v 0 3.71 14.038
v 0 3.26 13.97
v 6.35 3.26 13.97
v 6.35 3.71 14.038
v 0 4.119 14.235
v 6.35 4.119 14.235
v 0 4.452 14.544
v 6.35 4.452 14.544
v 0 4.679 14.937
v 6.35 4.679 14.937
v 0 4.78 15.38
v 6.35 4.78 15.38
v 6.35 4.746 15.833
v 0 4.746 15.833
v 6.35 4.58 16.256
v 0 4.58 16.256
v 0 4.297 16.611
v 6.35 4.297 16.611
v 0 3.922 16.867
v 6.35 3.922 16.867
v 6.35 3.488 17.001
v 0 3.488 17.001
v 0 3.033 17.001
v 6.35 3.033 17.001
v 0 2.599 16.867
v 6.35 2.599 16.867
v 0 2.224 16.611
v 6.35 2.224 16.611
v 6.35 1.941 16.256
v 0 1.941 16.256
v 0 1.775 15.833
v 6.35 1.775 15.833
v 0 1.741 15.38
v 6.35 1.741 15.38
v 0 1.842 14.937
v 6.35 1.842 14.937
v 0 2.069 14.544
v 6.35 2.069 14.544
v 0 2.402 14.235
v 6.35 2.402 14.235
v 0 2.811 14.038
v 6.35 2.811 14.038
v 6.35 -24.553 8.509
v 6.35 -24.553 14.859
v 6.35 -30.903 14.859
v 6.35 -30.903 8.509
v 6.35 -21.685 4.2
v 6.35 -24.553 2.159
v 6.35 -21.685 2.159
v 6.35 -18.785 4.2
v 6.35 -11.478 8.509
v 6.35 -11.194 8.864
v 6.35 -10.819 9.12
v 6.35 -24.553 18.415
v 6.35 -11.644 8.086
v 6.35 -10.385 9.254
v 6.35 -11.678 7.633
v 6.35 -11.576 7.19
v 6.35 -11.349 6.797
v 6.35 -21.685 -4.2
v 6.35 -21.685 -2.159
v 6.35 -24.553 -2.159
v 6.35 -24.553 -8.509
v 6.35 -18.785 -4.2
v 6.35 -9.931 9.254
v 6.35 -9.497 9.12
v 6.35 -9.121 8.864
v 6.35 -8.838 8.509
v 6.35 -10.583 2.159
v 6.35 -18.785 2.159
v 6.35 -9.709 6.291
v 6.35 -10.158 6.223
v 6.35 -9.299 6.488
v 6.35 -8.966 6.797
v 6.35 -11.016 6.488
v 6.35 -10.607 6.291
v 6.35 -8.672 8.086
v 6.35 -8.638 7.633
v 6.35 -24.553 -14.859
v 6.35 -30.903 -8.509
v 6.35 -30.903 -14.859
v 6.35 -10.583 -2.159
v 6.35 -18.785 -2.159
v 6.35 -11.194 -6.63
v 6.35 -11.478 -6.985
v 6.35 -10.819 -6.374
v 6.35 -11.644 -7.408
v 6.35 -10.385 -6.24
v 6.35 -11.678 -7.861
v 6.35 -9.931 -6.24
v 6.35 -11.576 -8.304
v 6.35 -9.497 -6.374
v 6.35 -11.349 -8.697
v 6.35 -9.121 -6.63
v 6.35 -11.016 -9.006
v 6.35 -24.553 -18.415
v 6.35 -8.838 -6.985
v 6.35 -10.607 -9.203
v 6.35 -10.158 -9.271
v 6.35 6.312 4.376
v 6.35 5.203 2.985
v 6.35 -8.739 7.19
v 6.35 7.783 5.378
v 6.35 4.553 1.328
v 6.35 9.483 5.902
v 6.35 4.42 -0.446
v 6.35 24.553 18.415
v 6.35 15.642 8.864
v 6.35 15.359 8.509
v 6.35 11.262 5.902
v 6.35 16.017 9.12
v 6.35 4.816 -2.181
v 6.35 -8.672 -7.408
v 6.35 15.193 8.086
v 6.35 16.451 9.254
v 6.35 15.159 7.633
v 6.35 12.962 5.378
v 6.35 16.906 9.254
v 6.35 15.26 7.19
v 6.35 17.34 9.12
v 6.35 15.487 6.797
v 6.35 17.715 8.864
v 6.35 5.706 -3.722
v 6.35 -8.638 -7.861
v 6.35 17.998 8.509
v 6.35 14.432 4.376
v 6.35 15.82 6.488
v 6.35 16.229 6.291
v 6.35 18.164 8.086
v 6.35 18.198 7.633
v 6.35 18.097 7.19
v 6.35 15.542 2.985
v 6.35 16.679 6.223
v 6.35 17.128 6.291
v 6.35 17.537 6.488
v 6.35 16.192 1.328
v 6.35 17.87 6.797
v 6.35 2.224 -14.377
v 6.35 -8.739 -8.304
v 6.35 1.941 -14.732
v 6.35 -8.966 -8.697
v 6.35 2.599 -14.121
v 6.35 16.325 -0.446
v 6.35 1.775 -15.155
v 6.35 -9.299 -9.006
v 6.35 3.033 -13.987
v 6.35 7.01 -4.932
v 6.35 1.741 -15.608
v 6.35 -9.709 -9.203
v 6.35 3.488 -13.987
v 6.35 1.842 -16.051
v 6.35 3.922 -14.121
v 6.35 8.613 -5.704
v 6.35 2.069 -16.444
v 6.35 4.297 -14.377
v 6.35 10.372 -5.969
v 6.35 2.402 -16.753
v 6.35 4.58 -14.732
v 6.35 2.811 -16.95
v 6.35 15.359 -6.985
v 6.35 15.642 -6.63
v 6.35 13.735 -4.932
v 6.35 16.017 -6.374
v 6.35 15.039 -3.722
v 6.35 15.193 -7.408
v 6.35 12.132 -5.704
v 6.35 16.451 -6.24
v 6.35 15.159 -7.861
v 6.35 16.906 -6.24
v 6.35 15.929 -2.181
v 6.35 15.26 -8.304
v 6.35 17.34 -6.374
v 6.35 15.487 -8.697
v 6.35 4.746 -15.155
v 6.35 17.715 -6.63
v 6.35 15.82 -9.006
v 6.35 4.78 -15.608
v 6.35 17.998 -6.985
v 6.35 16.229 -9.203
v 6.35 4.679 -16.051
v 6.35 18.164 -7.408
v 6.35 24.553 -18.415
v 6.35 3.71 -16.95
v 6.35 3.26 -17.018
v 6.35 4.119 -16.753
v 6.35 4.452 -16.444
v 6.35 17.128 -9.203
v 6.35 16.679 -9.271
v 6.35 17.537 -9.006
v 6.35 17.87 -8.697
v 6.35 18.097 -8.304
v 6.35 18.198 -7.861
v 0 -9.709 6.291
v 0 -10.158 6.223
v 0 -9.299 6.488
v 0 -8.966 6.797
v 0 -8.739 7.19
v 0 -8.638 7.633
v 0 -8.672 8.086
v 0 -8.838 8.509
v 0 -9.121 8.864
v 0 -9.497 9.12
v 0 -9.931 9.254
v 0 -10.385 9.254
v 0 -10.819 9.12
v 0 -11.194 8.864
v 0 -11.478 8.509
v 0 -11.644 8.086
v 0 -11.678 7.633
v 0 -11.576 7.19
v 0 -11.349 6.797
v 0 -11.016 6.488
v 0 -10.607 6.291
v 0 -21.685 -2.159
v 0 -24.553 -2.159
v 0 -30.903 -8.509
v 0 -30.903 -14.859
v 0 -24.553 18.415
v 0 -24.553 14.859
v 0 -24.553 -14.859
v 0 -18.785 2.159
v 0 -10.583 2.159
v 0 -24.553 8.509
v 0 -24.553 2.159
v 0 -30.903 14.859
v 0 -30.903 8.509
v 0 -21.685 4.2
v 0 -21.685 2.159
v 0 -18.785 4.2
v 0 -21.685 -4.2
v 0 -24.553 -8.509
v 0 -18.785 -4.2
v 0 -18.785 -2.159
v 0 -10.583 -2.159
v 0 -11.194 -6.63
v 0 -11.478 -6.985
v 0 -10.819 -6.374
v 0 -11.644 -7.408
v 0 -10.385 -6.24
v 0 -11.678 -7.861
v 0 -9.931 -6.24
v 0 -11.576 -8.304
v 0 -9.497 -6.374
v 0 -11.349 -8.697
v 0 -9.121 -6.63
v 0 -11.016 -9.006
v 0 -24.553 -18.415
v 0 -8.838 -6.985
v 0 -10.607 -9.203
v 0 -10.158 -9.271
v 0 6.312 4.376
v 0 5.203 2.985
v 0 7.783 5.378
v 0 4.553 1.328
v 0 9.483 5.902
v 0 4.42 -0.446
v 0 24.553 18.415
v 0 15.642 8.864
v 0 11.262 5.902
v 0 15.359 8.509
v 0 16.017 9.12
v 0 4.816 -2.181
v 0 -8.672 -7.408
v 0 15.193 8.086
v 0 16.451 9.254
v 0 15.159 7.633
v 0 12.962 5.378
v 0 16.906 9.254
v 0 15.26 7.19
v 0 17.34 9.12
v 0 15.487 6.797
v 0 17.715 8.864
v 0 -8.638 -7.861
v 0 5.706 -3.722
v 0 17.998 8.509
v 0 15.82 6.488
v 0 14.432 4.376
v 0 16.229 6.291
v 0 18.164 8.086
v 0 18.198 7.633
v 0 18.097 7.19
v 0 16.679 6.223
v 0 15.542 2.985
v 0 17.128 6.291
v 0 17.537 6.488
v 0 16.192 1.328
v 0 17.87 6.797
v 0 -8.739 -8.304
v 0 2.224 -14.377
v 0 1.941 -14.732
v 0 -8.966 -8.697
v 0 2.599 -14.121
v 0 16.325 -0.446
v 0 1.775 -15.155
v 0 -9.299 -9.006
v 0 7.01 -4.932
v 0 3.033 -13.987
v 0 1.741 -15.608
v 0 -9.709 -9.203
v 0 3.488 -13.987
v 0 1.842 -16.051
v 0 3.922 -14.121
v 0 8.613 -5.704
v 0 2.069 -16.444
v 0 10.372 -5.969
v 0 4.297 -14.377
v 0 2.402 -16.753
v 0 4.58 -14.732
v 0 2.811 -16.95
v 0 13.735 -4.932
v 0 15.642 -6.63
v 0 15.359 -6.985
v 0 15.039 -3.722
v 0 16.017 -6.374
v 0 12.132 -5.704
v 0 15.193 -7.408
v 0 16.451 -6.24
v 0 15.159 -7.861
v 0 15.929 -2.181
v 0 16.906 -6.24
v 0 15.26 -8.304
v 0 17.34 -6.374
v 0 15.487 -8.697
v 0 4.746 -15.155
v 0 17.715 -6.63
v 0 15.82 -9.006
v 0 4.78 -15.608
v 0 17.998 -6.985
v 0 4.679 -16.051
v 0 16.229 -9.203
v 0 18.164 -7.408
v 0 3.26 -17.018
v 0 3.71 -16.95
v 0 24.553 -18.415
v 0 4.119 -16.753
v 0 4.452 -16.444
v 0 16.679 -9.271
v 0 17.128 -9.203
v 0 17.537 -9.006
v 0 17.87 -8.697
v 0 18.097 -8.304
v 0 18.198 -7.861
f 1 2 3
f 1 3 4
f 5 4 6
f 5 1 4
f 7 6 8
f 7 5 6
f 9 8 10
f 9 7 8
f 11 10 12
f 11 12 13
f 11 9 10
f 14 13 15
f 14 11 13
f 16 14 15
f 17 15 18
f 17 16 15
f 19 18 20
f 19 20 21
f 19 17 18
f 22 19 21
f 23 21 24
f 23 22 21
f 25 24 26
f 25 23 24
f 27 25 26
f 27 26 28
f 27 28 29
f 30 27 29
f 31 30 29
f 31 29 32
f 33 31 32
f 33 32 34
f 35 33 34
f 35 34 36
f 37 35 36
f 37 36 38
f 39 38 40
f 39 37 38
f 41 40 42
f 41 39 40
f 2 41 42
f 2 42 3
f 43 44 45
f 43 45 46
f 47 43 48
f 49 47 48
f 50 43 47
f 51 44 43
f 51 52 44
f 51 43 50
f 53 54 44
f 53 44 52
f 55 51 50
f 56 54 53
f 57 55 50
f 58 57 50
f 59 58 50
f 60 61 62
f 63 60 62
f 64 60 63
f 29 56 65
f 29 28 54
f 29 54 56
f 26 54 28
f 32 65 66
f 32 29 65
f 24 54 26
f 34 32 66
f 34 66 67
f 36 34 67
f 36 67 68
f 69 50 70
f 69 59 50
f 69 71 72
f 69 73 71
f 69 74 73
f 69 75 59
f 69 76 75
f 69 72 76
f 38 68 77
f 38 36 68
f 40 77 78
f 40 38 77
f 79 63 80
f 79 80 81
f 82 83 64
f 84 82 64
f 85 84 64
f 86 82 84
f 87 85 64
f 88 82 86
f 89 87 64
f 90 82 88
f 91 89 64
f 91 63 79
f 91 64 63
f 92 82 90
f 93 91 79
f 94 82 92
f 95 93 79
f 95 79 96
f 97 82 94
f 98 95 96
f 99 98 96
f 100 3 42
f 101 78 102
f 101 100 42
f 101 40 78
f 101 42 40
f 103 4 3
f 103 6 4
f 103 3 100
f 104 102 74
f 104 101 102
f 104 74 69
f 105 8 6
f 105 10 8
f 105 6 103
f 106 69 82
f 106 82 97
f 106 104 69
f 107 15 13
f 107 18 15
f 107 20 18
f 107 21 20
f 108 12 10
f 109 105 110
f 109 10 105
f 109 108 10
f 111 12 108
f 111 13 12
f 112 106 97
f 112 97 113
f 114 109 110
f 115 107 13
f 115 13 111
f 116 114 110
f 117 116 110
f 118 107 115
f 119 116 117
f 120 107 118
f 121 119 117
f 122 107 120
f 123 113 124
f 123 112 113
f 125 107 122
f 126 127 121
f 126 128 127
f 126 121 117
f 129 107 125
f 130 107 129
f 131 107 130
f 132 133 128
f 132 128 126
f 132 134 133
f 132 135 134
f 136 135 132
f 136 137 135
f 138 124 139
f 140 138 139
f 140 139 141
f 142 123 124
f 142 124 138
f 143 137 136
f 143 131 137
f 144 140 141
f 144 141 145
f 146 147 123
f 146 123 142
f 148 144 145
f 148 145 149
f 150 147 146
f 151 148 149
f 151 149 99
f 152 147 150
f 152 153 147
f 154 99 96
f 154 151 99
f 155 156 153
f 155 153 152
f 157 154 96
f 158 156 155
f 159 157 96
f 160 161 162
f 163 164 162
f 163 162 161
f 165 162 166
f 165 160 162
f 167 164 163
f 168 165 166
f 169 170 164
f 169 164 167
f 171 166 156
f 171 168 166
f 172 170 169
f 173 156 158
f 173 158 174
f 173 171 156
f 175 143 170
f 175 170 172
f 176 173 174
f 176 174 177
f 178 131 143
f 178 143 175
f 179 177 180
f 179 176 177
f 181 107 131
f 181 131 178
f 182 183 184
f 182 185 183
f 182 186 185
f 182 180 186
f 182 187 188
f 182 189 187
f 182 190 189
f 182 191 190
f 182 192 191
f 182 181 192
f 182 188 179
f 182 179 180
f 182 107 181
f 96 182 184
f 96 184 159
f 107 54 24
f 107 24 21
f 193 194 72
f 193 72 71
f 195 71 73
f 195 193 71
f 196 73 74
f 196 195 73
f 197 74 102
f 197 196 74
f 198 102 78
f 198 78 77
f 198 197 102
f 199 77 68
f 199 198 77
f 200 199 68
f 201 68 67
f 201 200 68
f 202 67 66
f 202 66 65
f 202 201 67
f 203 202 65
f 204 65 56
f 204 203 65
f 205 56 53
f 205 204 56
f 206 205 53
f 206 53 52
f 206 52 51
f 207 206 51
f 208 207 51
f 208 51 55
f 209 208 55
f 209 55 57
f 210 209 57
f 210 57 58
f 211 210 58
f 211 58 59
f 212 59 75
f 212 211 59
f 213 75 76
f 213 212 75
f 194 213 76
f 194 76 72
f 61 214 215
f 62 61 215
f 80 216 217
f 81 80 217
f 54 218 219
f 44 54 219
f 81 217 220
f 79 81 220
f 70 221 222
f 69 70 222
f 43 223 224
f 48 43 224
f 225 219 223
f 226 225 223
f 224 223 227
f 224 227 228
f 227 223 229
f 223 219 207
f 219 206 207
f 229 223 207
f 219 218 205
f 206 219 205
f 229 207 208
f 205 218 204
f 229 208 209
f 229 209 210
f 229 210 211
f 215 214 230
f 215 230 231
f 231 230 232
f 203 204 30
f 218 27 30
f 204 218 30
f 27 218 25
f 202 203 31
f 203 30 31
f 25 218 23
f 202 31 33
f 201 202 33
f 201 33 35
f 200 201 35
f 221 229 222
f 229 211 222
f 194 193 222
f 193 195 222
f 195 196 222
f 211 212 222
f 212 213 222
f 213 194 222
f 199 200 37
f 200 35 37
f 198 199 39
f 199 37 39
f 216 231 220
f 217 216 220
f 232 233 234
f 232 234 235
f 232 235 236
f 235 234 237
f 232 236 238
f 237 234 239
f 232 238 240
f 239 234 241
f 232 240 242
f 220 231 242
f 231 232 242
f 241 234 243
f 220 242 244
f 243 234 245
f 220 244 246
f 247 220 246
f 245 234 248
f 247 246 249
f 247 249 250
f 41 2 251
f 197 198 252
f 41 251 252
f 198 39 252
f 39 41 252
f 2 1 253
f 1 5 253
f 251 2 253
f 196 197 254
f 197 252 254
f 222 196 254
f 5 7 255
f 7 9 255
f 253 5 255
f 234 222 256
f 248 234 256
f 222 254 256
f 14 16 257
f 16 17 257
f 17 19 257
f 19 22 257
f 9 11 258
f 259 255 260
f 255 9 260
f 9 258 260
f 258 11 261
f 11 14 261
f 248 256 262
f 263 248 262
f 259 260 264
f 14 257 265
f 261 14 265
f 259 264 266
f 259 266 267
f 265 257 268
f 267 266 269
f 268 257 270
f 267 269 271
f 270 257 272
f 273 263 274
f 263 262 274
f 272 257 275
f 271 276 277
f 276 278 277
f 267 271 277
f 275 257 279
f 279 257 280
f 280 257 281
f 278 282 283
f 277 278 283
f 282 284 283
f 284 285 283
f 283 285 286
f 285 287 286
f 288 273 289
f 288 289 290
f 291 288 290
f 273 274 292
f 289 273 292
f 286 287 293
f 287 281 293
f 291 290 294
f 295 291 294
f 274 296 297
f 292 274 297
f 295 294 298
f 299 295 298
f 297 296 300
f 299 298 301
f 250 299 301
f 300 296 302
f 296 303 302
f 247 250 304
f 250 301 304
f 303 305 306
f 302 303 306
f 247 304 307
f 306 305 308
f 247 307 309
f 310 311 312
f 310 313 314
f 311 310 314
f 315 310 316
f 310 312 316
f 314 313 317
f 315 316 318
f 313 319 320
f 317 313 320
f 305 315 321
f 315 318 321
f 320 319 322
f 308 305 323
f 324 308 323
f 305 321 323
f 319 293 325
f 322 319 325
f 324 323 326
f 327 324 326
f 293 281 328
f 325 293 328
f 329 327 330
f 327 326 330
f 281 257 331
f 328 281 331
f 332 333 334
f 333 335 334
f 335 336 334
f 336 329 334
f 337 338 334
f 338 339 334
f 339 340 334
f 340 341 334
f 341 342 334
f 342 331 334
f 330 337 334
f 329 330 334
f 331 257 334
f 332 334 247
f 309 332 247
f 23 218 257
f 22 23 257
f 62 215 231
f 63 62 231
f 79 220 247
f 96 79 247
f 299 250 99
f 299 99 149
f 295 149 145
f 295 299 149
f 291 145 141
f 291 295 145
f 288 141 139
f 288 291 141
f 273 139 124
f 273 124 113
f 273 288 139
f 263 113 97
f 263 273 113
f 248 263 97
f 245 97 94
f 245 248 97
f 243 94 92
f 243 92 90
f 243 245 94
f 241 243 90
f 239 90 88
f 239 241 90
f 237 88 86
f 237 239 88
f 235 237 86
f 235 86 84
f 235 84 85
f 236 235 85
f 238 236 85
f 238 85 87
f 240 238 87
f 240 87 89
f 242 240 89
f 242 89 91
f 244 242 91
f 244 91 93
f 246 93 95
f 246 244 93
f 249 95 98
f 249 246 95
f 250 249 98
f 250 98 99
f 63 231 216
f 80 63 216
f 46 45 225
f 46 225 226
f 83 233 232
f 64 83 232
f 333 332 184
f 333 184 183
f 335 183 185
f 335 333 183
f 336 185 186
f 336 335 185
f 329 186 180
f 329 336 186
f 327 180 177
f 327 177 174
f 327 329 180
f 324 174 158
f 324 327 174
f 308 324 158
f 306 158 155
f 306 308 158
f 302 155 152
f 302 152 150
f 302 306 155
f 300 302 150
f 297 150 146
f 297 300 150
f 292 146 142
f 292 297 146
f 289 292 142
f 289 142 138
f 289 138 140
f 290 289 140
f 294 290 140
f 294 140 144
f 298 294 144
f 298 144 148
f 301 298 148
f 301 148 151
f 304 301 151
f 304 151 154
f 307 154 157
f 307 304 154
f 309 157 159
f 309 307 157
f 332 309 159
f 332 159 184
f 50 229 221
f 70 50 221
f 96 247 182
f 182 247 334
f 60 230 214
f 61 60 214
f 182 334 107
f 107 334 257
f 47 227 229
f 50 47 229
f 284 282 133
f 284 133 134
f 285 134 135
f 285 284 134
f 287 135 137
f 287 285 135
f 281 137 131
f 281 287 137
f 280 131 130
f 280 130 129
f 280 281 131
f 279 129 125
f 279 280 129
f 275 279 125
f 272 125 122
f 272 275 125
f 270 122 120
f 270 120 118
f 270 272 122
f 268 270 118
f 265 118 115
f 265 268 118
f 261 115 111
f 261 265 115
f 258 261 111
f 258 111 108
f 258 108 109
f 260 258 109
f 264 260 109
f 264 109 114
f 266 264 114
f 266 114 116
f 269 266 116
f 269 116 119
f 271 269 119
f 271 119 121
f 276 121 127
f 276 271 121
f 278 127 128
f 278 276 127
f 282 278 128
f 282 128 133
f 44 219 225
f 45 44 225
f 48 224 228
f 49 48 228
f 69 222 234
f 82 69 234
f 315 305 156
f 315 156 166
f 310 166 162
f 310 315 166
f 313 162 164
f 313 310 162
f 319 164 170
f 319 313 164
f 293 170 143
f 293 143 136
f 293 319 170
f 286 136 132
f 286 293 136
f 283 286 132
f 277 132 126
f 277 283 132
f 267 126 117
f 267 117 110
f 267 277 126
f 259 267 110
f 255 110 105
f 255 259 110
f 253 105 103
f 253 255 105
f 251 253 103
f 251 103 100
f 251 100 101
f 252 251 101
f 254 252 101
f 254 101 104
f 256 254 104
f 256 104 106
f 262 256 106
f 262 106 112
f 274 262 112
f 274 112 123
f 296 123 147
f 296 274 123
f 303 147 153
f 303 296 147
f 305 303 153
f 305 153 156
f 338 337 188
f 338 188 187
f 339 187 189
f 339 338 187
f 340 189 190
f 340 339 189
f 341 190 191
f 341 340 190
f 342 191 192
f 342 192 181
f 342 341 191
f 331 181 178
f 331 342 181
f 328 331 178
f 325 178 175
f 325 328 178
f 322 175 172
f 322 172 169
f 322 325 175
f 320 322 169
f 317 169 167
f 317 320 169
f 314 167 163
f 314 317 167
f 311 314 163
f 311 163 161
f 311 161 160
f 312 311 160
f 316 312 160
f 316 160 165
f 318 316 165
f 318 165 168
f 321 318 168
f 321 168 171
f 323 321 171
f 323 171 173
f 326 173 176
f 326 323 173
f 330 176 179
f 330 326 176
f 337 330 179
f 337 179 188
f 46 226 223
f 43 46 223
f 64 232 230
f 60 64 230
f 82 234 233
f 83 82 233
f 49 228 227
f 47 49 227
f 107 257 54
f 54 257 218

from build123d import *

# Parameters (mm, degrees)
MOTOR_PLATE_R       = 1.524
MOTOR_PLATE_R_2     = 5.969
BOSS_EXTRUDE1_DEPTH = 6.35


with BuildPart() as part:
    # Motor plate → Boss-Extrude1 (new body)
    with BuildSketch(Plane(origin=(0, 0, 0), x_dir=(0, 0, -1), z_dir=(1, 0, 0))):
        Polygon((-18.415, -24.552598803), (-14.859, -24.552598803), (-14.859, -30.902598803), (-8.509, -30.902598803), (-8.509, -24.552598803), (-2.159, -24.552598803), (-2.159, -21.684895821), (-4.199999982, -21.684895821), (-4.199999982, -18.784895779), (-2.159, -18.784895779), (-2.159, -10.582598803), (2.159, -10.582598803), (2.159, -18.784895779), (4.199999982, -18.784895779), (4.199999982, -21.684895821), (2.159, -21.684895821), (2.159, -24.552598803), (8.509, -24.552598803), (8.509, -30.902598803), (14.859, -30.902598803), (14.859, -24.552598803), (18.415, -24.552598803), (18.415, 24.552598803), (-18.415, 24.552598803), align=None)
        with Locations((7.747, 16.678598803)):
            Circle(MOTOR_PLATE_R, mode=Mode.SUBTRACT)
        with Locations((15.494, 3.260401197)):
            Circle(MOTOR_PLATE_R, mode=Mode.SUBTRACT)
        with Locations((7.747, -10.157796409)):
            Circle(MOTOR_PLATE_R, mode=Mode.SUBTRACT)
        with Locations((-7.747, -10.157796409)):
            Circle(MOTOR_PLATE_R, mode=Mode.SUBTRACT)
        with Locations((-15.494, 3.260401197)):
            Circle(MOTOR_PLATE_R, mode=Mode.SUBTRACT)
        with Locations((-7.747, 16.678598803)):
            Circle(MOTOR_PLATE_R, mode=Mode.SUBTRACT)
        with Locations((0, 10.372401197)):
            Circle(MOTOR_PLATE_R_2, mode=Mode.SUBTRACT)
    extrude(amount=BOSS_EXTRUDE1_DEPTH)


solid = part.part
